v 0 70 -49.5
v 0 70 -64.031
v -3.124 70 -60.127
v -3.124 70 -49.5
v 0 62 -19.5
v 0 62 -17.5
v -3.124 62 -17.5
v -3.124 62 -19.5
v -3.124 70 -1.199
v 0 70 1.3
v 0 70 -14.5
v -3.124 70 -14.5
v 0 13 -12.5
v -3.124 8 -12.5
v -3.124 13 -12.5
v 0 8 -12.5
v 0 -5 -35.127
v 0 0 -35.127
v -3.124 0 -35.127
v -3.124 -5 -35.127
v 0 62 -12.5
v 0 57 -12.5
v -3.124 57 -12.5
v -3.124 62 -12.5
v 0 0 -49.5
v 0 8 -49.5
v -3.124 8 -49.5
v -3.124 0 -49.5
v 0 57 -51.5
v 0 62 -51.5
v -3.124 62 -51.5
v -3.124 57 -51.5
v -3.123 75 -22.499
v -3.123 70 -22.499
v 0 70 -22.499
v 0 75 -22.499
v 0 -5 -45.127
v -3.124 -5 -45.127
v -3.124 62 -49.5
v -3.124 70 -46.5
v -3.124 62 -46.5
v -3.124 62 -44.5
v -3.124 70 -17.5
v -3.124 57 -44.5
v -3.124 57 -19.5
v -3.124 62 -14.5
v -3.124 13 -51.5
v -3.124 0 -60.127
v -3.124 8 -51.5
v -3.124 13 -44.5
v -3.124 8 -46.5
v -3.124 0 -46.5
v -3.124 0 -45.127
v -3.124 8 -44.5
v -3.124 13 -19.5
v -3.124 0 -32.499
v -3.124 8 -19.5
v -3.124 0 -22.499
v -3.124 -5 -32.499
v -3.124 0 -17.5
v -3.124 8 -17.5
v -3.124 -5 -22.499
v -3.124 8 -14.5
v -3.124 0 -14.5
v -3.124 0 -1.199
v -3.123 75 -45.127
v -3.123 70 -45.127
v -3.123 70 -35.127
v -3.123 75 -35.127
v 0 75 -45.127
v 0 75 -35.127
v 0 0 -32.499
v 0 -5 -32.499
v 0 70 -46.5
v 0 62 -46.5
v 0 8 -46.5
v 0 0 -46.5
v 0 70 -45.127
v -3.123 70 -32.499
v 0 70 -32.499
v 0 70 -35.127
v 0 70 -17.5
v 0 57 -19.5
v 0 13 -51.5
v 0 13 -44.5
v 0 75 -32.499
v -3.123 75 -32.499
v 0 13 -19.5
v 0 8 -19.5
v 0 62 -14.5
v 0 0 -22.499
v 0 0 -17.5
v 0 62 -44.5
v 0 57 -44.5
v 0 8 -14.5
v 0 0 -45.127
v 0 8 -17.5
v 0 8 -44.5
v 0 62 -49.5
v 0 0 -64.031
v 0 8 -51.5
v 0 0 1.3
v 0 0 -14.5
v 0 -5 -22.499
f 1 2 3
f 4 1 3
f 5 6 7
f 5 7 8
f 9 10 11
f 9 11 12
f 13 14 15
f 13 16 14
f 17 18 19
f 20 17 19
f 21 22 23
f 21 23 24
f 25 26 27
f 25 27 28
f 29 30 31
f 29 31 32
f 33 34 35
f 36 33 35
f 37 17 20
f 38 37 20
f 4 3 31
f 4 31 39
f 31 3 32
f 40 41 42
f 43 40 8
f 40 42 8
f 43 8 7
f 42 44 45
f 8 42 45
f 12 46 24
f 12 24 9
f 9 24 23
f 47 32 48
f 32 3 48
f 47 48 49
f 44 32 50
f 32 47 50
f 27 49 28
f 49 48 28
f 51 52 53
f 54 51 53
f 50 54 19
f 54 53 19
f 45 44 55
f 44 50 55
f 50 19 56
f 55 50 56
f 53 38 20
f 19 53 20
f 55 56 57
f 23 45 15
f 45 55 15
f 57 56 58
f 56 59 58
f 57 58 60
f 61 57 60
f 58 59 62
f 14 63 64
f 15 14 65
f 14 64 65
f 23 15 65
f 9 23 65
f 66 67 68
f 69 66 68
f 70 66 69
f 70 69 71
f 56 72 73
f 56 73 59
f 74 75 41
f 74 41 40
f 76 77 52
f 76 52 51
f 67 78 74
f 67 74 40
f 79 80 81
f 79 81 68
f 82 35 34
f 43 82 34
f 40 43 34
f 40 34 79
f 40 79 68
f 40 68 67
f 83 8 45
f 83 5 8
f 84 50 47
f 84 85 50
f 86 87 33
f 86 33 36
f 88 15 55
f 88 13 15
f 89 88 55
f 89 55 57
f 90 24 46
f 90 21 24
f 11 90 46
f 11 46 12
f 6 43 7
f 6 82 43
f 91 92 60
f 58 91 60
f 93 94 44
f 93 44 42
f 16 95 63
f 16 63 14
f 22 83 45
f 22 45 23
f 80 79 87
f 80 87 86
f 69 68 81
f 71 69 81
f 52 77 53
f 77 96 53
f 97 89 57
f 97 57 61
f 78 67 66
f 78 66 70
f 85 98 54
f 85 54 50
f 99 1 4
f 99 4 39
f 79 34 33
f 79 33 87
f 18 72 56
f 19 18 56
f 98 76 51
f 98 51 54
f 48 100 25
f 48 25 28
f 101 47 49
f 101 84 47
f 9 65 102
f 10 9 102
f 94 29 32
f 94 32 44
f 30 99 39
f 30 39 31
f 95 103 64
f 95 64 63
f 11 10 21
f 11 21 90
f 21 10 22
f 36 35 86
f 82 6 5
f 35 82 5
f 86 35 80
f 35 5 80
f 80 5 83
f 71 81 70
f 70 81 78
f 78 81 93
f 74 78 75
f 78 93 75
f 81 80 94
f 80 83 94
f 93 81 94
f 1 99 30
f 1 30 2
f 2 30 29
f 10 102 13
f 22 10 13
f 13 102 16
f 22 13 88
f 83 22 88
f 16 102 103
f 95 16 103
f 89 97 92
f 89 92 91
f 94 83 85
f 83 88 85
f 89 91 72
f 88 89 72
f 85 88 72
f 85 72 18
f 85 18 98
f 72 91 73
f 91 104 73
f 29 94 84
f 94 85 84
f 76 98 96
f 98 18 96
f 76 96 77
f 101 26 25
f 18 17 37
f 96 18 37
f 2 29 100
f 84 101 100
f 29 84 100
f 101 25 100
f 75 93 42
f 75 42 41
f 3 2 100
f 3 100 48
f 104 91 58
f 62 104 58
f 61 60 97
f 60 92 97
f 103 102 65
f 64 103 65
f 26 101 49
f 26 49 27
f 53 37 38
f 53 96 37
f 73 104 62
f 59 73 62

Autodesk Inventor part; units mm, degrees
ref_plane "YZ Plane" through (0, 0, 0) normal (1, 0, 0) x (0, 1, 0)
ref_plane "XZ Plane" through (0, 0, 0) normal (0, 1, 0) x (-1, 0, 0)
ref_plane "XY Plane" through (0, 0, 0) normal (0, 0, 1) x (1, 0, 0)
sketch "Sketch3" plane through (0, 0, 0) normal (0, 1, 0) x (-1, 0, 0)
  line L0 (0, 0) -> (0, -64.031)
  line L1 (0, -64.031) -> (3.1235, -60.1267)
  line L2 (0, -64.031) -> (3.1235, -60.1267)
  line L3 (3.1235, -60.1267) -> (3.1235, -2.4988)
  line L4 (0, 0) -> (3.1235, -2.4988)
  line L5 (3.1235, -2.4988) -> (0, -2.4988)
  line L6 (0, -2.4988) -> (0, -12.4988)
  line L7 (3.1235, -2.4988) -> (3.1235, -12.4988)
  line L8 (3.1235, -60.1267) -> (0, -60.1267)
  line L9 (3.1235, -60.1267) -> (3.1235, -50.1267)
  line L10 (0, 0) -> (0, -20)
  line L11 (0, -64.031) -> (0, -48.031)
  line L12 (0, -50.1267) -> (0, -48.031)
  line L13 (0, -20) -> (0, -30)
  line L14 (0, -60.1267) -> (0, -45.1267)
  line L15 (0, -45.1267) -> (3.1235, -45.1267)
  line L16 (0, -45.1267) -> (0, -35.1267)
  line L17 (0, -35.1267) -> (3.1235, -35.1267)
  line L18 (0, -2.4988) -> (0, -22.4988)
  line L19 (0, -22.4988) -> (3.1235, -22.4988)
  line L20 (0, -22.4988) -> (0, -32.4988)
  line L21 (0, -32.4988) -> (3.1235, -32.4988)
  line L22 (0, 0) -> (0, -16)
  line L23 (0, -16) -> (3.1235, -16)
  line L24 (0, -64.031) -> (0, -48.031)
  line L25 (0, -48.031) -> (3.1235, -48.031)
  line L26 (0, -48.031) -> (0, -45.1267)
  line L27 (3.1235, -22.4988) -> (3.1235, -16)
  line L28 (3.1235, -2.4988) -> (3.1235, -1.1988)
  line L29 (3.1235, -1.1988) -> (0, 1.3)
  line L30 (0, 1.3) -> (0, 0)
  point P0 (3.1235, -20)
  point P1 (3.1235, -30)
  dimension "d80" = 15
  dimension "d81" = 10
  dimension "d86" = 20
  dimension "d87" = 10
  dimension "d90" = 16
  dimension "d91" = 16
  dimension "d92" = 2.9043
  dimension "d93" = 6.4988
  dimension "d96" = 1.3
extrude "Extrusion4" add sketch "Sketch3" along normal blind 70 contours L4 L5 L0 | L5 L3 L23 L0 | L23 L3 L19 L0 | L3 L21 L0 L19 | L3 L17 L0 L21 | L3 L15 L0 L17 | L3 L25 L0 L15 | L3 L8 L0 L25 | L1 L0 L8
sketch "Sketch4" plane through (0, 0, 0) normal (1, 0, 0) x (0, 0, -1)
  line L0 (0, 0) -> (16, 0)
  line L1 (16, 0) -> (48, 0)
  line L2 (48, 0) -> (64, 0)
  line L3 (16, 0) -> (14.5, 0)
  line L4 (14.5, 0) -> (14.5, 8)
  line L5 (14.5, 8) -> (12.5, 8)
  line L6 (12.5, 8) -> (12.5, 13)
  line L7 (12.5, 13) -> (19.5, 13)
  line L8 (19.5, 13) -> (19.5, 8)
  line L9 (19.5, 8) -> (17.5, 8)
  line L10 (16, 0) -> (17.5, 0)
  line L11 (17.5, 0) -> (17.5, 8)
  line L12 (48, 0) -> (49.5, 0)
  line L13 (48, 0) -> (46.5, 0)
  line L14 (48, 0) -> (46.5, 0)
  line L15 (46.5, 0) -> (46.5, 8)
  line L16 (46.5, 8) -> (44.5, 8)
  line L17 (44.5, 8) -> (44.5, 13)
  line L18 (44.5, 13) -> (51.5, 13)
  line L19 (51.5, 13) -> (51.5, 8)
  line L20 (51.5, 8) -> (49.5, 8)
  line L21 (49.5, 8) -> (49.5, 0)
  line L22 (16, 13) -> (16, 57)
  line L23 (16, 70) -> (17.5, 70)
  line L24 (17.5, 70) -> (17.5, 62)
  line L25 (17.5, 62) -> (19.5, 62)
  line L26 (19.5, 62) -> (19.5, 57)
  line L27 (19.5, 57) -> (12.5, 57)
  line L28 (12.5, 57) -> (12.5, 62)
  line L29 (12.5, 62) -> (14.5, 62)
  line L30 (14.5, 62) -> (14.5, 70)
  line L31 (48, 13) -> (48, 57)
  line L32 (48, 70) -> (49.5, 70)
  line L33 (49.5, 70) -> (49.5, 62)
  line L34 (49.5, 62) -> (51.5, 62)
  line L35 (51.5, 62) -> (51.5, 57)
  line L36 (51.5, 57) -> (44.5, 57)
  line L37 (44.5, 57) -> (44.5, 62)
  line L38 (44.5, 62) -> (46.5, 62)
  line L39 (46.5, 62) -> (46.5, 70)
  line L40 (46.5, 70) -> (48, 70)
  line L41 (16, 70) -> (14.5, 70)
  dimension "d23" = 16
  dimension "d24" = 32
  dimension "d25" = 16
  dimension "d26" = 1.5
  dimension "d27" = 8
  dimension "d28" = 2
  dimension "d29" = 5
  dimension "d30" = 7
  dimension "d31" = 2
  dimension "d32" = 1.5
  dimension "d33" = 1.5
  dimension "d34" = 1.5
  dimension "d35" = 1.5
  dimension "d36" = 8
  dimension "d37" = 2
  dimension "d38" = 7
  dimension "d39" = 70
  dimension "d40" = 8
  dimension "d41" = 2
  dimension "d42" = 5
  dimension "d43" = 7
  dimension "d44" = 5
  dimension "d45" = 1.5
  dimension "d46" = 8
  dimension "d47" = 2
extrude "Extrusion5" cut sketch "Sketch4" against normal blind 3.2 contours L4 L5 L6 L7 L8 L9 L11 L1 L0
extrude "Extrusion6" cut sketch "Sketch4" against normal blind 3.2 contours L15 L16 L17 L18 L19 L20 L21 L2 L1
extrude "Extrusion7" cut sketch "Sketch4" against normal blind 3.2 contours L36 L37 L38 L39 L40 L32 L33 L34 L35
extrude "Extrusion8" cut sketch "Sketch4" against normal blind 3.2 contours L27 L28 L29 L30 L41 L23 L24 L25 L26
sketch "Sketch6" plane through (0, 70, 0) normal (0, 1, 0) x (1, 0, 0)
  line L0 (0, 0) -> (0, 2.499)
  line L1 (-3.123, 2.499) -> (-3.123, 12.499)
  line L2 (0, 12.499) -> (0, 2.499)
  line L3 (0, 0) -> (0, 64)
  line L4 (0, 2.499) -> (0, 60.127)
  line L5 (-3.123, 55.127) -> (-3.123, 45.127)
  line L6 (-3.123, 55.127) -> (-3.123, 40.127)
  line L7 (-3.123, 40.127) -> (-3.123, 30.127)
  line L8 (0, 30.127) -> (0, 40.127)
  line L9 (-3.123, 60.127) -> (0, 60.127)
  line L10 (-3.123, 60.127) -> (-3.123, 45.127)
  line L11 (-3.123, 45.127) -> (0, 45.127)
  line L12 (-3.123, 45.127) -> (-3.123, 35.127)
  line L13 (-3.123, 35.127) -> (0, 35.127)
  line L14 (0, 35.127) -> (0, 45.127)
  line L15 (-3.123, 2.499) -> (0, 2.499)
  line L16 (-3.123, 2.499) -> (-3.123, 22.499)
  line L17 (-3.123, 22.499) -> (0, 22.499)
  line L18 (-3.123, 22.499) -> (-3.123, 32.499)
  line L19 (-3.123, 32.499) -> (0, 32.499)
  line L20 (0, 32.499) -> (0, 22.499)
  line L21 (-3.123, 2.3854) -> (-3.123, 1.3854)
  line L22 (-2.9831, 1.2495) -> (0, -1.1378)
  line L23 (-2.9831, 1.2495) -> (0.8377, 1.2495) construction
  line L24 (0, -1.1378) -> (0, 0)
  dimension "d63" = 3.123
  dimension "d65" = 64
  dimension "d75" = 15
  dimension "d76" = 10
  dimension "d77" = 20
  dimension "d78" = 10
  dimension "d94" = 1
  dimension "d95" = 38.67
extrude "Extrusion13" add sketch "Sketch6" along normal blind 5 contours L18 L7 L19 L3 L17 | L7 L6 L11 L3 L13
extrude "Extrusion14" add sketch "Sketch3" against normal blind 5 contours L3 L21 L0 L19 | L3 L15 L0 L17
extrude "Extrusion15" add sketch "Sketch3" along normal blind 70 contours L30 L29 L28 L4
properties part number "lat_front_mdf"
